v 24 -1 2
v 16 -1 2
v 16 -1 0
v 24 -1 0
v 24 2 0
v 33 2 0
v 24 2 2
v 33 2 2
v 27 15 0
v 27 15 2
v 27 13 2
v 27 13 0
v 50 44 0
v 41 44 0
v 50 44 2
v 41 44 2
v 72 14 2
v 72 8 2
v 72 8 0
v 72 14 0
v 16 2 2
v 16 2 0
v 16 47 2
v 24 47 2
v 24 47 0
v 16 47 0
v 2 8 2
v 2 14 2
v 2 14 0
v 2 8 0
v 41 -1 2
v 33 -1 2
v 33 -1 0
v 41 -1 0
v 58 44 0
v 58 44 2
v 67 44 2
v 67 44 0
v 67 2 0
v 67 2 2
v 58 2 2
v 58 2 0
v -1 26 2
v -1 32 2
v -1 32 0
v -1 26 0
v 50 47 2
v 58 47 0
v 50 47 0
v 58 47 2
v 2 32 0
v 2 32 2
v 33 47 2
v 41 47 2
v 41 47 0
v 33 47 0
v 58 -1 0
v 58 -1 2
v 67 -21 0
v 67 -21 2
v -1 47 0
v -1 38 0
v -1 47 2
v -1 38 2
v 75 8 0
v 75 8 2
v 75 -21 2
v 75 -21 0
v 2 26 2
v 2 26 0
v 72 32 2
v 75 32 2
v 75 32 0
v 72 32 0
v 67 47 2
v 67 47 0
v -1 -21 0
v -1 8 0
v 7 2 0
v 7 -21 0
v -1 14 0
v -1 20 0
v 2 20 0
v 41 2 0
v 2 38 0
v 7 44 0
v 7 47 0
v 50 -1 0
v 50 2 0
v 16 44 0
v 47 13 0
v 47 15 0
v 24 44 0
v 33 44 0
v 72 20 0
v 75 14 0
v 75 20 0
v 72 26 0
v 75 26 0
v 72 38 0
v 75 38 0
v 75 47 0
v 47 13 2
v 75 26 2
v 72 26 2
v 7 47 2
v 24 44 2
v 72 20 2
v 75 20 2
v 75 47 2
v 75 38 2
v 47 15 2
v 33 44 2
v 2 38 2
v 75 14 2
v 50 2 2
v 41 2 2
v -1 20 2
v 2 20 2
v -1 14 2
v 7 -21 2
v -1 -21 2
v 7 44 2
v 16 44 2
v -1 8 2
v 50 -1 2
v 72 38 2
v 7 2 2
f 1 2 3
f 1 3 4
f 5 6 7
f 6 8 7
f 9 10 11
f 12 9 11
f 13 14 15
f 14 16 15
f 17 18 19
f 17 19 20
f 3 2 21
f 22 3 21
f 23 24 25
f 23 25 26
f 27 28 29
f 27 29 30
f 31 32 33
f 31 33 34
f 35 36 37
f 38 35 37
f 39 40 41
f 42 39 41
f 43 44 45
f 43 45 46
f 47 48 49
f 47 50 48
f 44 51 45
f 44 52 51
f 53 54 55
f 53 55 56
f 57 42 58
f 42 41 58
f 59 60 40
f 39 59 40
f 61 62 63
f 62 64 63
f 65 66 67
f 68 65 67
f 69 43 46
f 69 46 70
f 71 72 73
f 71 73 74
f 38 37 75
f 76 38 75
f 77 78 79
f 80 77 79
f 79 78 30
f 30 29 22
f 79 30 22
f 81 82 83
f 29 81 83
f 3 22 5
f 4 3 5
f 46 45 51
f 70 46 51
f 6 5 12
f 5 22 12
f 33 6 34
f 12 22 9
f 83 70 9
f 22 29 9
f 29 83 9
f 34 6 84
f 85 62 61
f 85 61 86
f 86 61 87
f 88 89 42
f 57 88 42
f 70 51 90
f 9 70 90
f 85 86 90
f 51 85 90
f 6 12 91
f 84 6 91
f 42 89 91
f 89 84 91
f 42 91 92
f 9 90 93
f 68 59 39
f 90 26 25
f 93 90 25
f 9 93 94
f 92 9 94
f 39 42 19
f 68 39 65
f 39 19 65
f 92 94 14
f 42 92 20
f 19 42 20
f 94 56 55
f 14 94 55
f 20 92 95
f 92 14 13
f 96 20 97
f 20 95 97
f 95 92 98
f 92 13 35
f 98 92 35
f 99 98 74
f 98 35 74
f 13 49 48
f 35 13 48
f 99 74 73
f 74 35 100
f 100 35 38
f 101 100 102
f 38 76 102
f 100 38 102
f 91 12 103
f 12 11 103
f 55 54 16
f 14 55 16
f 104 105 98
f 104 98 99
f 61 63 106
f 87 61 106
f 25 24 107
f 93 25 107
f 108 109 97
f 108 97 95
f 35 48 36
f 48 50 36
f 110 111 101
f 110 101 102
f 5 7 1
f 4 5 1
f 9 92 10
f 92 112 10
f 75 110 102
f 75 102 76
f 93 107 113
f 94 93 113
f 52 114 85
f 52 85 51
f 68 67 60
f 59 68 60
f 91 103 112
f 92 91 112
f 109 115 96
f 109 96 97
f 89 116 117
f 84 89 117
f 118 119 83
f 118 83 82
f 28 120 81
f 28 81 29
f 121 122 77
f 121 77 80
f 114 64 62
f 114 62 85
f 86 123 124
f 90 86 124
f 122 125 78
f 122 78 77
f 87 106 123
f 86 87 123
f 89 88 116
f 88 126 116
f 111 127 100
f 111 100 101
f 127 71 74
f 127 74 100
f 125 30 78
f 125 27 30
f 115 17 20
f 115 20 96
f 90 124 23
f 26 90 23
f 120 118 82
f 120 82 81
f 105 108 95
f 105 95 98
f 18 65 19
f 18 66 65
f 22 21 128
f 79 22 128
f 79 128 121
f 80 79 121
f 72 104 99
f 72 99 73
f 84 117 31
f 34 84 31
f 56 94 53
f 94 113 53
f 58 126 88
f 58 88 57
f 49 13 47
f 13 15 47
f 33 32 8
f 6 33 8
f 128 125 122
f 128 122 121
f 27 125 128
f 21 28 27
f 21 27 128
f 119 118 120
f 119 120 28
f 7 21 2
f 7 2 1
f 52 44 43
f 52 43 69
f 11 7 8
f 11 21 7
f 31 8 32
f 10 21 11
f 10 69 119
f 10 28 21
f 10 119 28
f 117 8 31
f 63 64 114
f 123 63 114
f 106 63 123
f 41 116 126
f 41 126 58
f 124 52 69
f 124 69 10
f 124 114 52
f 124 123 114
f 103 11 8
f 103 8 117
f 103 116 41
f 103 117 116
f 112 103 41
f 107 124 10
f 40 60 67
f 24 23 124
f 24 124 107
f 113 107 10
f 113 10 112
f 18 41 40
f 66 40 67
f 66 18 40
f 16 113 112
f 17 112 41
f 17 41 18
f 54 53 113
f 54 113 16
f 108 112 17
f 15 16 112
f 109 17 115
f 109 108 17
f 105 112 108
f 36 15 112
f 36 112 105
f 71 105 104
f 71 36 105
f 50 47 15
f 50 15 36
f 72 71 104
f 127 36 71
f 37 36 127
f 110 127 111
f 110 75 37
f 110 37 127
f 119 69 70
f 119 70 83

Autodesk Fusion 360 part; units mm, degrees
sketch "スケッチ1" plane through (0, 0, 0) normal (0, 0, 1) x (1, 0, 0)
  line L0 (0, 0) -> (74, 0)
  line L1 (74, 0) -> (74, 46)
  line L2 (74, 46) -> (0, 46)
  line L3 (0, 46) -> (0, 0)
  dimension "d1" = 46
  dimension "d2" = 74
extrude "押し出し1" add sketch "スケッチ1" along normal blind 2
sketch "スケッチ2" plane through (0, 0, 2) normal (0, 0, 1) x (-1, 0, 0)
  line L0 (0, -46) -> (0, 0)
  line L1 (0, 0) -> (-74, 0)
  line L2 (-74, 0) -> (-74, -46)
  line L3 (-74, -46) -> (0, -46)
  line L4 (-27, -13) -> (-47, -13)
  line L5 (-47, -13) -> (-47, -15)
  line L6 (-47, -15) -> (-27, -15)
  line L7 (-27, -15) -> (-27, -13)
  dimension "d5" = 2
  dimension "d6" = 20
  dimension "d7" = 13
  dimension "d8" = 27
extrude "押し出し2" cut sketch "スケッチ2" against normal blind 2 contours L4 L5 L6 L7
sketch "スケッチ3" plane through (0, 0, 2) normal (0, 0, 1) x (-1, 0, 0)
  line L0 (-47, -13) -> (-27, -13)
  line L1 (-27, -13) -> (-27, -15)
  line L2 (-27, -15) -> (-47, -15)
  line L3 (-47, -15) -> (-47, -13)
  line L4 (0, -46) -> (0, 0)
  line L5 (0, 0) -> (-74, 0)
  line L6 (-74, 0) -> (-74, -46)
  line L7 (-74, -46) -> (0, -46)
  line L8 (-67, -46) -> (-58, -46)
  line L9 (-58, -46) -> (-58, -44)
  line L10 (-58, -44) -> (-67, -44)
  line L11 (-67, -44) -> (-67, -46)
  line L12 (-50, -46) -> (-41, -46)
  line L13 (-50, -44) -> (-50, -46)
  line L14 (-41, -44) -> (-50, -44)
  line L15 (-41, -46) -> (-41, -44)
  line L16 (-33, -46) -> (-24, -46)
  line L17 (-33, -44) -> (-33, -46)
  line L18 (-24, -44) -> (-33, -44)
  line L19 (-24, -46) -> (-24, -44)
  line L20 (-16, -46) -> (-7, -46)
  line L21 (-16, -44) -> (-16, -46)
  line L22 (-7, -44) -> (-16, -44)
  line L23 (-7, -46) -> (-7, -44)
  line L24 (-24, 0) -> (-33, 0)
  line L25 (-33, 0) -> (-33, -2)
  line L26 (-58, 0) -> (-67, 0)
  line L27 (-50, 0) -> (-50, -2)
  line L28 (-50, -2) -> (-41, -2)
  line L29 (-7, -2) -> (-7, 0)
  line L30 (-7, 0) -> (-16, 0)
  line L31 (-16, 0) -> (-16, -2)
  line L32 (-33, -2) -> (-24, -2)
  line L33 (-67, 0) -> (-67, -2)
  line L34 (-41, -2) -> (-41, 0)
  line L35 (-16, -2) -> (-7, -2)
  line L36 (-24, -2) -> (-24, 0)
  line L37 (-41, 0) -> (-50, 0)
  line L38 (-67, -2) -> (-58, -2)
  line L39 (-58, -2) -> (-58, 0)
  line L40 (0, -38) -> (-2, -38)
  line L41 (-2, -38) -> (-2, -32)
  line L42 (-2, -32) -> (0, -32)
  line L43 (0, -32) -> (0, -38)
  line L44 (-2, -20) -> (0, -20)
  line L45 (-2, -26) -> (-2, -20)
  line L46 (0, -26) -> (-2, -26)
  line L47 (0, -20) -> (0, -26)
  line L48 (-2, -8) -> (0, -8)
  line L49 (-2, -14) -> (-2, -8)
  line L50 (0, -14) -> (-2, -14)
  line L51 (0, -8) -> (0, -14)
  line L52 (-74, -20) -> (-72, -20)
  line L53 (-72, -8) -> (-72, -14)
  line L54 (-74, -8) -> (-72, -8)
  line L55 (-72, -14) -> (-74, -14)
  line L56 (-74, -38) -> (-74, -32)
  line L57 (-72, -32) -> (-72, -38)
  line L58 (-72, -26) -> (-74, -26)
  line L59 (-74, -32) -> (-72, -32)
  line L60 (-74, -14) -> (-74, -8)
  line L61 (-72, -20) -> (-72, -26)
  line L62 (-74, -26) -> (-74, -20)
  line L63 (-72, -38) -> (-74, -38)
  dimension "d11" = 9
  dimension "d12" = 2
  dimension "d13" = 7
  dimension "d16" = 17
  dimension "d17" = 0
  dimension "d20" = 0
  dimension "d21" = 44
  dimension "d22" = 6
  dimension "d23" = 2
  dimension "d24" = 8
  dimension "d27" = 0
  dimension "d28" = 12
  dimension "d31" = -72
  dimension "d32" = 0
extrude "押し出し3" cut sketch "スケッチ3" against normal blind 2 contours L4 L40 L41 L42 L43 | L7 L20 L21 L22 L23 | L4 L44 L45 L46 L47 | L7 L16 L17 L18 L19 | L4 L48 L49 L50 L51 | L7 L12 L13 L14 L15 | L7 L8 L9 L10 L11 | L5 L29 L30 L31 L35 | L5 L24 L25 L32 L36 | L6 L56 L57 L59 L63 | L5 L27 L28 L34 L37 | L6 L52 L58 L61 L62 | L5 L26 L33 L38 L39 | L6 L53 L54 L55 L60
sketch "スケッチ4" plane through (0, 0, 2) normal (0, 0, 1) x (-1, 0, 0)
  line L0 (-50, -2) -> (-50, 0)
  line L1 (-50, 0) -> (-58, 0)
  line L2 (-58, 0) -> (-58, -2)
  line L3 (-58, -2) -> (-67, -2)
  line L4 (-67, -2) -> (-67, 0)
  line L5 (-67, 0) -> (-74, 0)
  line L6 (-74, 0) -> (-74, -8)
  line L7 (-74, -8) -> (-72, -8)
  line L8 (-72, -8) -> (-72, -14)
  line L9 (-72, -14) -> (-74, -14)
  line L10 (-74, -14) -> (-74, -20)
  line L11 (-74, -20) -> (-72, -20)
  line L12 (-72, -20) -> (-72, -26)
  line L13 (-72, -26) -> (-74, -26)
  line L14 (-74, -26) -> (-74, -32)
  line L15 (-74, -32) -> (-72, -32)
  line L16 (-72, -32) -> (-72, -38)
  line L17 (-72, -38) -> (-74, -38)
  line L18 (-74, -38) -> (-74, -46)
  line L19 (-74, -46) -> (-67, -46)
  line L20 (-67, -46) -> (-67, -44)
  line L21 (-67, -44) -> (-58, -44)
  line L22 (-58, -44) -> (-58, -46)
  line L23 (-58, -46) -> (-50, -46)
  line L24 (-50, -46) -> (-50, -44)
  line L25 (-50, -44) -> (-41, -44)
  line L26 (-41, -44) -> (-41, -46)
  line L27 (-41, -46) -> (-33, -46)
  line L28 (-33, -46) -> (-33, -44)
  line L29 (-33, -44) -> (-24, -44)
  line L30 (-24, -44) -> (-24, -46)
  line L31 (-24, -46) -> (-16, -46)
  line L32 (-16, -46) -> (-16, -44)
  line L33 (-16, -44) -> (-7, -44)
  line L34 (-7, -44) -> (-7, -46)
  line L35 (-7, -46) -> (0, -46)
  line L36 (0, -46) -> (0, -38)
  line L37 (0, -38) -> (-2, -38)
  line L38 (-2, -38) -> (-2, -32)
  line L39 (-2, -32) -> (0, -32)
  line L40 (0, -32) -> (0, -26)
  line L41 (0, -26) -> (-2, -26)
  line L42 (-2, -26) -> (-2, -20)
  line L43 (-2, -20) -> (0, -20)
  line L44 (0, -20) -> (0, -14)
  line L45 (0, -14) -> (-2, -14)
  line L46 (-2, -14) -> (-2, -8)
  line L47 (-2, -8) -> (0, -8)
  line L48 (0, -8) -> (0, 0)
  line L49 (0, 0) -> (-7, 0)
  line L50 (-7, 0) -> (-7, -2)
  line L51 (-7, -2) -> (-16, -2)
  line L52 (-16, -2) -> (-16, 0)
  line L53 (-16, 0) -> (-24, 0)
  line L54 (-24, 0) -> (-24, -2)
  line L55 (-24, -2) -> (-33, -2)
  line L56 (-33, -2) -> (-33, 0)
  line L57 (-33, 0) -> (-41, 0)
  line L58 (-41, 0) -> (-41, -2)
  line L59 (-41, -2) -> (-50, -2)
  line L60 (-47, -13) -> (-27, -13)
  line L61 (-27, -13) -> (-27, -15)
  line L62 (-27, -15) -> (-47, -15)
  line L63 (-47, -15) -> (-47, -13)
  line L64 (0, 0) -> (0, 20)
  line L65 (0, 20) -> (-7, 20)
  line L66 (-7, 20) -> (-7, 0)
  line L67 (-74, 0) -> (-74, 20)
  line L68 (-74, 20) -> (-67, 20)
  line L69 (-67, 20) -> (-67, 0)
extrude "押し出し4" add sketch "スケッチ4" against normal blind 2 contours L5 L67 L68 L69 | L49 L64 L65 L66
sketch "スケッチ5" plane through (0, 0, 2) normal (0, 0, 1) x (-1, 0, 0)
  line L0 (-50, -2) -> (-50, 0)
  line L1 (-50, 0) -> (-58, 0)
  line L2 (-58, 0) -> (-58, -2)
  line L3 (-58, -2) -> (-67, -2)
  line L4 (-67, -2) -> (-67, 20)
  line L5 (-67, 20) -> (-74, 20)
  line L6 (-74, 20) -> (-74, -8)
  line L7 (-74, -8) -> (-72, -8)
  line L8 (-72, -8) -> (-72, -14)
  line L9 (-72, -14) -> (-74, -14)
  line L10 (-74, -14) -> (-74, -20)
  line L11 (-74, -20) -> (-72, -20)
  line L12 (-72, -20) -> (-72, -26)
  line L13 (-72, -26) -> (-74, -26)
  line L14 (-74, -26) -> (-74, -32)
  line L15 (-74, -32) -> (-72, -32)
  line L16 (-72, -32) -> (-72, -38)
  line L17 (-72, -38) -> (-74, -38)
  line L18 (-74, -38) -> (-74, -46)
  line L19 (-74, -46) -> (-67, -46)
  line L20 (-67, -46) -> (-67, -44)
  line L21 (-67, -44) -> (-58, -44)
  line L22 (-58, -44) -> (-58, -46)
  line L23 (-58, -46) -> (-50, -46)
  line L24 (-50, -46) -> (-50, -44)
  line L25 (-50, -44) -> (-41, -44)
  line L26 (-41, -44) -> (-41, -46)
  line L27 (-41, -46) -> (-33, -46)
  line L28 (-33, -46) -> (-33, -44)
  line L29 (-33, -44) -> (-24, -44)
  line L30 (-24, -44) -> (-24, -46)
  line L31 (-24, -46) -> (-16, -46)
  line L32 (-16, -46) -> (-16, -44)
  line L33 (-16, -44) -> (-7, -44)
  line L34 (-7, -44) -> (-7, -46)
  line L35 (-7, -46) -> (0, -46)
  line L36 (0, -46) -> (0, -38)
  line L37 (0, -38) -> (-2, -38)
  line L38 (-2, -38) -> (-2, -32)
  line L39 (-2, -32) -> (0, -32)
  line L40 (0, -32) -> (0, -26)
  line L41 (0, -26) -> (-2, -26)
  line L42 (-2, -26) -> (-2, -20)
  line L43 (-2, -20) -> (0, -20)
  line L44 (0, -20) -> (0, -14)
  line L45 (0, -14) -> (-2, -14)
  line L46 (-2, -14) -> (-2, -8)
  line L47 (-2, -8) -> (0, -8)
  line L48 (0, -8) -> (0, 20)
  line L49 (0, 20) -> (-7, 20)
  line L50 (-7, 20) -> (-7, -2)
  line L51 (-7, -2) -> (-16, -2)
  line L52 (-16, -2) -> (-16, 0)
  line L53 (-16, 0) -> (-24, 0)
  line L54 (-24, 0) -> (-24, -2)
  line L55 (-24, -2) -> (-33, -2)
  line L56 (-33, -2) -> (-33, 0)
  line L57 (-33, 0) -> (-41, 0)
  line L58 (-41, 0) -> (-41, -2)
  line L59 (-41, -2) -> (-50, -2)
  line L60 (-47, -13) -> (-27, -13)
  line L61 (-27, -13) -> (-27, -15)
  line L62 (-27, -15) -> (-47, -15)
  line L63 (-47, -15) -> (-47, -13)
  line L64 (0, -47) -> (-7, -47)
  line L65 (-7, -47) -> (-7, -46)
  line L66 (-7, -46) -> (0, -46)
  line L67 (0, -46) -> (0, -47)
  line L68 (-16, -46) -> (-24, -46)
  line L69 (-24, -46) -> (-24, -47)
  line L70 (-24, -47) -> (-16, -47)
  line L71 (-16, -47) -> (-16, -46)
  line L72 (-33, -46) -> (-41, -46)
  line L73 (-41, -46) -> (-41, -47)
  line L74 (-41, -47) -> (-33, -47)
  line L75 (-33, -47) -> (-33, -46)
  line L76 (-50, -46) -> (-58, -46)
  line L77 (-58, -46) -> (-58, -47)
  line L78 (-58, -47) -> (-50, -47)
  line L79 (-50, -47) -> (-50, -46)
  line L80 (-67, -46) -> (-75, -46)
  line L81 (-75, -46) -> (-75, -47)
  line L82 (-75, -47) -> (-67, -47)
  line L83 (-67, -47) -> (-67, -46)
  line L84 (-75, -46) -> (-74, -46)
  line L85 (-74, -46) -> (-74, -38)
  line L86 (-74, -38) -> (-75, -38)
  line L87 (-75, -38) -> (-75, -46)
  line L88 (-75, -32) -> (-74, -32)
  line L89 (-74, -32) -> (-74, -26)
  line L90 (-74, -26) -> (-75, -26)
  line L91 (-75, -26) -> (-75, -32)
  line L92 (-75, -20) -> (-74, -20)
  line L93 (-74, -20) -> (-74, -14)
  line L94 (-74, -14) -> (-75, -14)
  line L95 (-75, -14) -> (-75, -20)
  line L96 (-75, -8) -> (-74, -8)
  line L97 (-74, -8) -> (-74, 20)
  line L98 (-74, 20) -> (-75, 20)
  line L99 (-75, 20) -> (-75, -8)
  line L100 (-75, 21) -> (-67, 21)
  line L101 (-67, 21) -> (-67, 20)
  line L102 (-67, 20) -> (-75, 20)
  line L103 (-75, 20) -> (-75, 21)
  line L104 (-58, 0) -> (-50, 0)
  line L105 (-50, 0) -> (-50, 1)
  line L106 (-50, 1) -> (-58, 1)
  line L107 (-58, 1) -> (-58, 0)
  line L108 (-41, 0) -> (-33, 0)
  line L109 (-33, 0) -> (-33, 1)
  line L110 (-33, 1) -> (-41, 1)
  line L111 (-41, 1) -> (-41, 0)
  line L112 (-24, 0) -> (-16, 0)
  line L113 (-16, 0) -> (-16, 1)
  line L114 (-16, 1) -> (-24, 1)
  line L115 (-24, 1) -> (-24, 0)
  line L116 (-7, 20) -> (1, 20)
  line L117 (1, 20) -> (1, 21)
  line L118 (1, 21) -> (-7, 21)
  line L119 (-7, 21) -> (-7, 20)
  line L120 (1, 20) -> (0, 20)
  line L121 (0, 20) -> (0, -8)
  line L122 (0, -8) -> (1, -8)
  line L123 (1, -8) -> (1, 20)
  line L124 (1, -14) -> (0, -14)
  line L125 (0, -14) -> (0, -20)
  line L126 (0, -20) -> (1, -20)
  line L127 (1, -20) -> (1, -14)
  line L128 (1, -26) -> (0, -26)
  line L129 (0, -26) -> (0, -32)
  line L130 (0, -32) -> (1, -32)
  line L131 (1, -32) -> (1, -26)
  line L132 (0, -38) -> (1, -38)
  line L133 (1, -38) -> (1, -47)
  line L134 (1, -47) -> (0, -47)
  line L135 (0, -47) -> (0, -38)
extrude "押し出し5" add sketch "スケッチ5" against normal blind 2 contours L1 L104 L105 L106 L107 | L57 L108 L109 L110 L111 | L5 L98 L100 L101 L102 L103 | L6 L96 L97 L98 L99 L102 | L53 L112 L113 L114 L115 | L10 L92 L93 L94 L95 | L49 L116 L117 L118 L119 L120 | L48 L116 L120 L121 L122 L123 | L14 L88 L89 L90 L91 | L44 L124 L125 L126 L127 | L18 L80 L84 L85 L86 L87 | L19 L80 L81 L82 L83 L84 | L40 L128 L129 L130 L131 | L23 L76 L77 L78 L79 | L36 L67 L132 L133 L134 L135 | L35 L64 L65 L66 L67 L135 | L27 L72 L73 L74 L75 | L31 L68 L69 L70 L71
sketch "スケッチ6" plane through (0, 0, 2) normal (0, 0, 1) x (-1, 0, 0)
  line L0 (-50, -2) -> (-50, 1)
  line L1 (-50, 1) -> (-58, 1)
  line L2 (-58, 1) -> (-58, -2)
  line L3 (-58, -2) -> (-67, -2)
  line L4 (-67, -2) -> (-67, 21)
  line L5 (-67, 21) -> (-75, 21)
  line L6 (-75, 21) -> (-75, -8)
  line L7 (-75, -8) -> (-72, -8)
  line L8 (-72, -8) -> (-72, -14)
  line L9 (-72, -14) -> (-75, -14)
  line L10 (-75, -14) -> (-75, -20)
  line L11 (-75, -20) -> (-72, -20)
  line L12 (-72, -20) -> (-72, -26)
  line L13 (-72, -26) -> (-75, -26)
  line L14 (-75, -26) -> (-75, -32)
  line L15 (-75, -32) -> (-72, -32)
  line L16 (-72, -32) -> (-72, -38)
  line L17 (-72, -38) -> (-75, -38)
  line L18 (-75, -38) -> (-75, -47)
  line L19 (-75, -47) -> (-67, -47)
  line L20 (-67, -47) -> (-67, -44)
  line L21 (-67, -44) -> (-58, -44)
  line L22 (-58, -44) -> (-58, -47)
  line L23 (-58, -47) -> (-50, -47)
  line L24 (-50, -47) -> (-50, -44)
  line L25 (-50, -44) -> (-41, -44)
  line L26 (-41, -44) -> (-41, -47)
  line L27 (-41, -47) -> (-33, -47)
  line L28 (-33, -47) -> (-33, -44)
  line L29 (-33, -44) -> (-24, -44)
  line L30 (-24, -44) -> (-24, -47)
  line L31 (-24, -47) -> (-16, -47)
  line L32 (-16, -47) -> (-16, -44)
  line L33 (-16, -44) -> (-7, -44)
  line L34 (-7, -44) -> (-7, -47)
  line L35 (-7, -47) -> (1, -47)
  line L36 (1, -47) -> (1, -38)
  line L37 (1, -38) -> (-2, -38)
  line L38 (-2, -38) -> (-2, -32)
  line L39 (-2, -32) -> (1, -32)
  line L40 (1, -32) -> (1, -26)
  line L41 (1, -26) -> (-2, -26)
  line L42 (-2, -26) -> (-2, -20)
  line L43 (-2, -20) -> (1, -20)
  line L44 (1, -20) -> (1, -14)
  line L45 (1, -14) -> (-2, -14)
  line L46 (-2, -14) -> (-2, -8)
  line L47 (-2, -8) -> (1, -8)
  line L48 (1, -8) -> (1, 21)
  line L49 (1, 21) -> (-7, 21)
  line L50 (-7, 21) -> (-7, -2)
  line L51 (-7, -2) -> (-16, -2)
  line L52 (-16, -2) -> (-16, 1)
  line L53 (-16, 1) -> (-24, 1)
  line L54 (-24, 1) -> (-24, -2)
  line L55 (-24, -2) -> (-33, -2)
  line L56 (-33, -2) -> (-33, 1)
  line L57 (-33, 1) -> (-41, 1)
  line L58 (-41, 1) -> (-41, -2)
  line L59 (-41, -2) -> (-50, -2)
  line L60 (-47, -13) -> (-27, -13)
  line L61 (-27, -13) -> (-27, -15)
  line L62 (-27, -15) -> (-47, -15)
  line L63 (-47, -15) -> (-47, -13)
